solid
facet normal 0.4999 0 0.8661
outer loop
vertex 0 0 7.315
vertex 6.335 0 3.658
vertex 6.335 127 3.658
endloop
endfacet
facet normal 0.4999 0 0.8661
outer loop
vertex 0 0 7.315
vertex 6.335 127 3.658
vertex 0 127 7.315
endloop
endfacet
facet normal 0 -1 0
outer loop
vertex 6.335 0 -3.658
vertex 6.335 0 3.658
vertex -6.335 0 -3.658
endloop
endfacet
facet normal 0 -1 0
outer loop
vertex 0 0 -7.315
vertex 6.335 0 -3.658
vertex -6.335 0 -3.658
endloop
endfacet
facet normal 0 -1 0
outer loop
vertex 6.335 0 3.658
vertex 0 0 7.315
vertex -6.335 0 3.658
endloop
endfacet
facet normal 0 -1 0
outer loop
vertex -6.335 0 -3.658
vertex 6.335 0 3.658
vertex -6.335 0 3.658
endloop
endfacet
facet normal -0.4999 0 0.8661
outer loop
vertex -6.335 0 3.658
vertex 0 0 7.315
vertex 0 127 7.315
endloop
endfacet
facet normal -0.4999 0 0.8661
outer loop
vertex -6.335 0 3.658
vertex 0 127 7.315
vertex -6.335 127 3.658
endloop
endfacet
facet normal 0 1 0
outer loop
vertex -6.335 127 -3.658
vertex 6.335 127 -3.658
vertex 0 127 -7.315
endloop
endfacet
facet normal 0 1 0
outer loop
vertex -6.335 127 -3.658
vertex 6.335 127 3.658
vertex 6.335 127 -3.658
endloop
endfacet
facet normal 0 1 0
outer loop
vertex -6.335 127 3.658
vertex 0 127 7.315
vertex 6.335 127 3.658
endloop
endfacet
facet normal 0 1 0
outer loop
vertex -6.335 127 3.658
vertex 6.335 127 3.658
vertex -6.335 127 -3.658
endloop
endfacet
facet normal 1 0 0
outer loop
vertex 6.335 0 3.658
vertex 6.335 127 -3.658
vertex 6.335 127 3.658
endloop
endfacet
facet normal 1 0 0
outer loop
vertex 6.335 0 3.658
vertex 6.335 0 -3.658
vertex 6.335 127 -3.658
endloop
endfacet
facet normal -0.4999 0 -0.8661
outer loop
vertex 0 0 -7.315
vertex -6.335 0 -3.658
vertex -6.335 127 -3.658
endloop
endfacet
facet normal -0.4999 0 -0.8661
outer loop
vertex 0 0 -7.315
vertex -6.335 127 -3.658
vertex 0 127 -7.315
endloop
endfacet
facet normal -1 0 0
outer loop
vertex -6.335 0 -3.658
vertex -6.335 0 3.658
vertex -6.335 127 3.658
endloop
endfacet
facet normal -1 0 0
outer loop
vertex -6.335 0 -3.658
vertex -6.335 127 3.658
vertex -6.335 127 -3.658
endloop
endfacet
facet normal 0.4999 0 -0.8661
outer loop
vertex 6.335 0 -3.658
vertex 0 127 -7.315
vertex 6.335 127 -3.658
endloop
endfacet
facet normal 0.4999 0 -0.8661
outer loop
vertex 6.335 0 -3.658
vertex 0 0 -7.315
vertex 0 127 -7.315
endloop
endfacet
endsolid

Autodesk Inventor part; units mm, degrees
ref_plane "YZ Plane" through (0, 0, 0) normal (1, 0, 0) x (0, 1, 0)
ref_plane "XZ Plane" through (0, 0, 0) normal (0, 1, 0) x (-1, 0, 0)
ref_plane "XY Plane" through (0, 0, 0) normal (0, 0, 1) x (1, 0, 0)
sketch "Sketch1" plane through (0, 0, 0) normal (0, 1, 0) x (-1, 0, 0)
  line L0 (0, -7.3152) -> (-6.3351, -3.6576)
  line L1 (-6.3351, -3.6576) -> (-6.3351, 3.6576)
  line L2 (-6.3351, 3.6576) -> (0, 7.3152)
  line L3 (0, 7.3152) -> (6.3351, 3.6576)
  line L4 (6.3351, 3.6576) -> (6.3351, -3.6576)
  line L5 (6.3351, -3.6576) -> (0, -7.3152)
  point P0 (0, 0)
  point P1 (0, 0)
  dimension "d0" = 7.3152
extrude "Extrusion1" add sketch "Sketch1" along normal blind 127
